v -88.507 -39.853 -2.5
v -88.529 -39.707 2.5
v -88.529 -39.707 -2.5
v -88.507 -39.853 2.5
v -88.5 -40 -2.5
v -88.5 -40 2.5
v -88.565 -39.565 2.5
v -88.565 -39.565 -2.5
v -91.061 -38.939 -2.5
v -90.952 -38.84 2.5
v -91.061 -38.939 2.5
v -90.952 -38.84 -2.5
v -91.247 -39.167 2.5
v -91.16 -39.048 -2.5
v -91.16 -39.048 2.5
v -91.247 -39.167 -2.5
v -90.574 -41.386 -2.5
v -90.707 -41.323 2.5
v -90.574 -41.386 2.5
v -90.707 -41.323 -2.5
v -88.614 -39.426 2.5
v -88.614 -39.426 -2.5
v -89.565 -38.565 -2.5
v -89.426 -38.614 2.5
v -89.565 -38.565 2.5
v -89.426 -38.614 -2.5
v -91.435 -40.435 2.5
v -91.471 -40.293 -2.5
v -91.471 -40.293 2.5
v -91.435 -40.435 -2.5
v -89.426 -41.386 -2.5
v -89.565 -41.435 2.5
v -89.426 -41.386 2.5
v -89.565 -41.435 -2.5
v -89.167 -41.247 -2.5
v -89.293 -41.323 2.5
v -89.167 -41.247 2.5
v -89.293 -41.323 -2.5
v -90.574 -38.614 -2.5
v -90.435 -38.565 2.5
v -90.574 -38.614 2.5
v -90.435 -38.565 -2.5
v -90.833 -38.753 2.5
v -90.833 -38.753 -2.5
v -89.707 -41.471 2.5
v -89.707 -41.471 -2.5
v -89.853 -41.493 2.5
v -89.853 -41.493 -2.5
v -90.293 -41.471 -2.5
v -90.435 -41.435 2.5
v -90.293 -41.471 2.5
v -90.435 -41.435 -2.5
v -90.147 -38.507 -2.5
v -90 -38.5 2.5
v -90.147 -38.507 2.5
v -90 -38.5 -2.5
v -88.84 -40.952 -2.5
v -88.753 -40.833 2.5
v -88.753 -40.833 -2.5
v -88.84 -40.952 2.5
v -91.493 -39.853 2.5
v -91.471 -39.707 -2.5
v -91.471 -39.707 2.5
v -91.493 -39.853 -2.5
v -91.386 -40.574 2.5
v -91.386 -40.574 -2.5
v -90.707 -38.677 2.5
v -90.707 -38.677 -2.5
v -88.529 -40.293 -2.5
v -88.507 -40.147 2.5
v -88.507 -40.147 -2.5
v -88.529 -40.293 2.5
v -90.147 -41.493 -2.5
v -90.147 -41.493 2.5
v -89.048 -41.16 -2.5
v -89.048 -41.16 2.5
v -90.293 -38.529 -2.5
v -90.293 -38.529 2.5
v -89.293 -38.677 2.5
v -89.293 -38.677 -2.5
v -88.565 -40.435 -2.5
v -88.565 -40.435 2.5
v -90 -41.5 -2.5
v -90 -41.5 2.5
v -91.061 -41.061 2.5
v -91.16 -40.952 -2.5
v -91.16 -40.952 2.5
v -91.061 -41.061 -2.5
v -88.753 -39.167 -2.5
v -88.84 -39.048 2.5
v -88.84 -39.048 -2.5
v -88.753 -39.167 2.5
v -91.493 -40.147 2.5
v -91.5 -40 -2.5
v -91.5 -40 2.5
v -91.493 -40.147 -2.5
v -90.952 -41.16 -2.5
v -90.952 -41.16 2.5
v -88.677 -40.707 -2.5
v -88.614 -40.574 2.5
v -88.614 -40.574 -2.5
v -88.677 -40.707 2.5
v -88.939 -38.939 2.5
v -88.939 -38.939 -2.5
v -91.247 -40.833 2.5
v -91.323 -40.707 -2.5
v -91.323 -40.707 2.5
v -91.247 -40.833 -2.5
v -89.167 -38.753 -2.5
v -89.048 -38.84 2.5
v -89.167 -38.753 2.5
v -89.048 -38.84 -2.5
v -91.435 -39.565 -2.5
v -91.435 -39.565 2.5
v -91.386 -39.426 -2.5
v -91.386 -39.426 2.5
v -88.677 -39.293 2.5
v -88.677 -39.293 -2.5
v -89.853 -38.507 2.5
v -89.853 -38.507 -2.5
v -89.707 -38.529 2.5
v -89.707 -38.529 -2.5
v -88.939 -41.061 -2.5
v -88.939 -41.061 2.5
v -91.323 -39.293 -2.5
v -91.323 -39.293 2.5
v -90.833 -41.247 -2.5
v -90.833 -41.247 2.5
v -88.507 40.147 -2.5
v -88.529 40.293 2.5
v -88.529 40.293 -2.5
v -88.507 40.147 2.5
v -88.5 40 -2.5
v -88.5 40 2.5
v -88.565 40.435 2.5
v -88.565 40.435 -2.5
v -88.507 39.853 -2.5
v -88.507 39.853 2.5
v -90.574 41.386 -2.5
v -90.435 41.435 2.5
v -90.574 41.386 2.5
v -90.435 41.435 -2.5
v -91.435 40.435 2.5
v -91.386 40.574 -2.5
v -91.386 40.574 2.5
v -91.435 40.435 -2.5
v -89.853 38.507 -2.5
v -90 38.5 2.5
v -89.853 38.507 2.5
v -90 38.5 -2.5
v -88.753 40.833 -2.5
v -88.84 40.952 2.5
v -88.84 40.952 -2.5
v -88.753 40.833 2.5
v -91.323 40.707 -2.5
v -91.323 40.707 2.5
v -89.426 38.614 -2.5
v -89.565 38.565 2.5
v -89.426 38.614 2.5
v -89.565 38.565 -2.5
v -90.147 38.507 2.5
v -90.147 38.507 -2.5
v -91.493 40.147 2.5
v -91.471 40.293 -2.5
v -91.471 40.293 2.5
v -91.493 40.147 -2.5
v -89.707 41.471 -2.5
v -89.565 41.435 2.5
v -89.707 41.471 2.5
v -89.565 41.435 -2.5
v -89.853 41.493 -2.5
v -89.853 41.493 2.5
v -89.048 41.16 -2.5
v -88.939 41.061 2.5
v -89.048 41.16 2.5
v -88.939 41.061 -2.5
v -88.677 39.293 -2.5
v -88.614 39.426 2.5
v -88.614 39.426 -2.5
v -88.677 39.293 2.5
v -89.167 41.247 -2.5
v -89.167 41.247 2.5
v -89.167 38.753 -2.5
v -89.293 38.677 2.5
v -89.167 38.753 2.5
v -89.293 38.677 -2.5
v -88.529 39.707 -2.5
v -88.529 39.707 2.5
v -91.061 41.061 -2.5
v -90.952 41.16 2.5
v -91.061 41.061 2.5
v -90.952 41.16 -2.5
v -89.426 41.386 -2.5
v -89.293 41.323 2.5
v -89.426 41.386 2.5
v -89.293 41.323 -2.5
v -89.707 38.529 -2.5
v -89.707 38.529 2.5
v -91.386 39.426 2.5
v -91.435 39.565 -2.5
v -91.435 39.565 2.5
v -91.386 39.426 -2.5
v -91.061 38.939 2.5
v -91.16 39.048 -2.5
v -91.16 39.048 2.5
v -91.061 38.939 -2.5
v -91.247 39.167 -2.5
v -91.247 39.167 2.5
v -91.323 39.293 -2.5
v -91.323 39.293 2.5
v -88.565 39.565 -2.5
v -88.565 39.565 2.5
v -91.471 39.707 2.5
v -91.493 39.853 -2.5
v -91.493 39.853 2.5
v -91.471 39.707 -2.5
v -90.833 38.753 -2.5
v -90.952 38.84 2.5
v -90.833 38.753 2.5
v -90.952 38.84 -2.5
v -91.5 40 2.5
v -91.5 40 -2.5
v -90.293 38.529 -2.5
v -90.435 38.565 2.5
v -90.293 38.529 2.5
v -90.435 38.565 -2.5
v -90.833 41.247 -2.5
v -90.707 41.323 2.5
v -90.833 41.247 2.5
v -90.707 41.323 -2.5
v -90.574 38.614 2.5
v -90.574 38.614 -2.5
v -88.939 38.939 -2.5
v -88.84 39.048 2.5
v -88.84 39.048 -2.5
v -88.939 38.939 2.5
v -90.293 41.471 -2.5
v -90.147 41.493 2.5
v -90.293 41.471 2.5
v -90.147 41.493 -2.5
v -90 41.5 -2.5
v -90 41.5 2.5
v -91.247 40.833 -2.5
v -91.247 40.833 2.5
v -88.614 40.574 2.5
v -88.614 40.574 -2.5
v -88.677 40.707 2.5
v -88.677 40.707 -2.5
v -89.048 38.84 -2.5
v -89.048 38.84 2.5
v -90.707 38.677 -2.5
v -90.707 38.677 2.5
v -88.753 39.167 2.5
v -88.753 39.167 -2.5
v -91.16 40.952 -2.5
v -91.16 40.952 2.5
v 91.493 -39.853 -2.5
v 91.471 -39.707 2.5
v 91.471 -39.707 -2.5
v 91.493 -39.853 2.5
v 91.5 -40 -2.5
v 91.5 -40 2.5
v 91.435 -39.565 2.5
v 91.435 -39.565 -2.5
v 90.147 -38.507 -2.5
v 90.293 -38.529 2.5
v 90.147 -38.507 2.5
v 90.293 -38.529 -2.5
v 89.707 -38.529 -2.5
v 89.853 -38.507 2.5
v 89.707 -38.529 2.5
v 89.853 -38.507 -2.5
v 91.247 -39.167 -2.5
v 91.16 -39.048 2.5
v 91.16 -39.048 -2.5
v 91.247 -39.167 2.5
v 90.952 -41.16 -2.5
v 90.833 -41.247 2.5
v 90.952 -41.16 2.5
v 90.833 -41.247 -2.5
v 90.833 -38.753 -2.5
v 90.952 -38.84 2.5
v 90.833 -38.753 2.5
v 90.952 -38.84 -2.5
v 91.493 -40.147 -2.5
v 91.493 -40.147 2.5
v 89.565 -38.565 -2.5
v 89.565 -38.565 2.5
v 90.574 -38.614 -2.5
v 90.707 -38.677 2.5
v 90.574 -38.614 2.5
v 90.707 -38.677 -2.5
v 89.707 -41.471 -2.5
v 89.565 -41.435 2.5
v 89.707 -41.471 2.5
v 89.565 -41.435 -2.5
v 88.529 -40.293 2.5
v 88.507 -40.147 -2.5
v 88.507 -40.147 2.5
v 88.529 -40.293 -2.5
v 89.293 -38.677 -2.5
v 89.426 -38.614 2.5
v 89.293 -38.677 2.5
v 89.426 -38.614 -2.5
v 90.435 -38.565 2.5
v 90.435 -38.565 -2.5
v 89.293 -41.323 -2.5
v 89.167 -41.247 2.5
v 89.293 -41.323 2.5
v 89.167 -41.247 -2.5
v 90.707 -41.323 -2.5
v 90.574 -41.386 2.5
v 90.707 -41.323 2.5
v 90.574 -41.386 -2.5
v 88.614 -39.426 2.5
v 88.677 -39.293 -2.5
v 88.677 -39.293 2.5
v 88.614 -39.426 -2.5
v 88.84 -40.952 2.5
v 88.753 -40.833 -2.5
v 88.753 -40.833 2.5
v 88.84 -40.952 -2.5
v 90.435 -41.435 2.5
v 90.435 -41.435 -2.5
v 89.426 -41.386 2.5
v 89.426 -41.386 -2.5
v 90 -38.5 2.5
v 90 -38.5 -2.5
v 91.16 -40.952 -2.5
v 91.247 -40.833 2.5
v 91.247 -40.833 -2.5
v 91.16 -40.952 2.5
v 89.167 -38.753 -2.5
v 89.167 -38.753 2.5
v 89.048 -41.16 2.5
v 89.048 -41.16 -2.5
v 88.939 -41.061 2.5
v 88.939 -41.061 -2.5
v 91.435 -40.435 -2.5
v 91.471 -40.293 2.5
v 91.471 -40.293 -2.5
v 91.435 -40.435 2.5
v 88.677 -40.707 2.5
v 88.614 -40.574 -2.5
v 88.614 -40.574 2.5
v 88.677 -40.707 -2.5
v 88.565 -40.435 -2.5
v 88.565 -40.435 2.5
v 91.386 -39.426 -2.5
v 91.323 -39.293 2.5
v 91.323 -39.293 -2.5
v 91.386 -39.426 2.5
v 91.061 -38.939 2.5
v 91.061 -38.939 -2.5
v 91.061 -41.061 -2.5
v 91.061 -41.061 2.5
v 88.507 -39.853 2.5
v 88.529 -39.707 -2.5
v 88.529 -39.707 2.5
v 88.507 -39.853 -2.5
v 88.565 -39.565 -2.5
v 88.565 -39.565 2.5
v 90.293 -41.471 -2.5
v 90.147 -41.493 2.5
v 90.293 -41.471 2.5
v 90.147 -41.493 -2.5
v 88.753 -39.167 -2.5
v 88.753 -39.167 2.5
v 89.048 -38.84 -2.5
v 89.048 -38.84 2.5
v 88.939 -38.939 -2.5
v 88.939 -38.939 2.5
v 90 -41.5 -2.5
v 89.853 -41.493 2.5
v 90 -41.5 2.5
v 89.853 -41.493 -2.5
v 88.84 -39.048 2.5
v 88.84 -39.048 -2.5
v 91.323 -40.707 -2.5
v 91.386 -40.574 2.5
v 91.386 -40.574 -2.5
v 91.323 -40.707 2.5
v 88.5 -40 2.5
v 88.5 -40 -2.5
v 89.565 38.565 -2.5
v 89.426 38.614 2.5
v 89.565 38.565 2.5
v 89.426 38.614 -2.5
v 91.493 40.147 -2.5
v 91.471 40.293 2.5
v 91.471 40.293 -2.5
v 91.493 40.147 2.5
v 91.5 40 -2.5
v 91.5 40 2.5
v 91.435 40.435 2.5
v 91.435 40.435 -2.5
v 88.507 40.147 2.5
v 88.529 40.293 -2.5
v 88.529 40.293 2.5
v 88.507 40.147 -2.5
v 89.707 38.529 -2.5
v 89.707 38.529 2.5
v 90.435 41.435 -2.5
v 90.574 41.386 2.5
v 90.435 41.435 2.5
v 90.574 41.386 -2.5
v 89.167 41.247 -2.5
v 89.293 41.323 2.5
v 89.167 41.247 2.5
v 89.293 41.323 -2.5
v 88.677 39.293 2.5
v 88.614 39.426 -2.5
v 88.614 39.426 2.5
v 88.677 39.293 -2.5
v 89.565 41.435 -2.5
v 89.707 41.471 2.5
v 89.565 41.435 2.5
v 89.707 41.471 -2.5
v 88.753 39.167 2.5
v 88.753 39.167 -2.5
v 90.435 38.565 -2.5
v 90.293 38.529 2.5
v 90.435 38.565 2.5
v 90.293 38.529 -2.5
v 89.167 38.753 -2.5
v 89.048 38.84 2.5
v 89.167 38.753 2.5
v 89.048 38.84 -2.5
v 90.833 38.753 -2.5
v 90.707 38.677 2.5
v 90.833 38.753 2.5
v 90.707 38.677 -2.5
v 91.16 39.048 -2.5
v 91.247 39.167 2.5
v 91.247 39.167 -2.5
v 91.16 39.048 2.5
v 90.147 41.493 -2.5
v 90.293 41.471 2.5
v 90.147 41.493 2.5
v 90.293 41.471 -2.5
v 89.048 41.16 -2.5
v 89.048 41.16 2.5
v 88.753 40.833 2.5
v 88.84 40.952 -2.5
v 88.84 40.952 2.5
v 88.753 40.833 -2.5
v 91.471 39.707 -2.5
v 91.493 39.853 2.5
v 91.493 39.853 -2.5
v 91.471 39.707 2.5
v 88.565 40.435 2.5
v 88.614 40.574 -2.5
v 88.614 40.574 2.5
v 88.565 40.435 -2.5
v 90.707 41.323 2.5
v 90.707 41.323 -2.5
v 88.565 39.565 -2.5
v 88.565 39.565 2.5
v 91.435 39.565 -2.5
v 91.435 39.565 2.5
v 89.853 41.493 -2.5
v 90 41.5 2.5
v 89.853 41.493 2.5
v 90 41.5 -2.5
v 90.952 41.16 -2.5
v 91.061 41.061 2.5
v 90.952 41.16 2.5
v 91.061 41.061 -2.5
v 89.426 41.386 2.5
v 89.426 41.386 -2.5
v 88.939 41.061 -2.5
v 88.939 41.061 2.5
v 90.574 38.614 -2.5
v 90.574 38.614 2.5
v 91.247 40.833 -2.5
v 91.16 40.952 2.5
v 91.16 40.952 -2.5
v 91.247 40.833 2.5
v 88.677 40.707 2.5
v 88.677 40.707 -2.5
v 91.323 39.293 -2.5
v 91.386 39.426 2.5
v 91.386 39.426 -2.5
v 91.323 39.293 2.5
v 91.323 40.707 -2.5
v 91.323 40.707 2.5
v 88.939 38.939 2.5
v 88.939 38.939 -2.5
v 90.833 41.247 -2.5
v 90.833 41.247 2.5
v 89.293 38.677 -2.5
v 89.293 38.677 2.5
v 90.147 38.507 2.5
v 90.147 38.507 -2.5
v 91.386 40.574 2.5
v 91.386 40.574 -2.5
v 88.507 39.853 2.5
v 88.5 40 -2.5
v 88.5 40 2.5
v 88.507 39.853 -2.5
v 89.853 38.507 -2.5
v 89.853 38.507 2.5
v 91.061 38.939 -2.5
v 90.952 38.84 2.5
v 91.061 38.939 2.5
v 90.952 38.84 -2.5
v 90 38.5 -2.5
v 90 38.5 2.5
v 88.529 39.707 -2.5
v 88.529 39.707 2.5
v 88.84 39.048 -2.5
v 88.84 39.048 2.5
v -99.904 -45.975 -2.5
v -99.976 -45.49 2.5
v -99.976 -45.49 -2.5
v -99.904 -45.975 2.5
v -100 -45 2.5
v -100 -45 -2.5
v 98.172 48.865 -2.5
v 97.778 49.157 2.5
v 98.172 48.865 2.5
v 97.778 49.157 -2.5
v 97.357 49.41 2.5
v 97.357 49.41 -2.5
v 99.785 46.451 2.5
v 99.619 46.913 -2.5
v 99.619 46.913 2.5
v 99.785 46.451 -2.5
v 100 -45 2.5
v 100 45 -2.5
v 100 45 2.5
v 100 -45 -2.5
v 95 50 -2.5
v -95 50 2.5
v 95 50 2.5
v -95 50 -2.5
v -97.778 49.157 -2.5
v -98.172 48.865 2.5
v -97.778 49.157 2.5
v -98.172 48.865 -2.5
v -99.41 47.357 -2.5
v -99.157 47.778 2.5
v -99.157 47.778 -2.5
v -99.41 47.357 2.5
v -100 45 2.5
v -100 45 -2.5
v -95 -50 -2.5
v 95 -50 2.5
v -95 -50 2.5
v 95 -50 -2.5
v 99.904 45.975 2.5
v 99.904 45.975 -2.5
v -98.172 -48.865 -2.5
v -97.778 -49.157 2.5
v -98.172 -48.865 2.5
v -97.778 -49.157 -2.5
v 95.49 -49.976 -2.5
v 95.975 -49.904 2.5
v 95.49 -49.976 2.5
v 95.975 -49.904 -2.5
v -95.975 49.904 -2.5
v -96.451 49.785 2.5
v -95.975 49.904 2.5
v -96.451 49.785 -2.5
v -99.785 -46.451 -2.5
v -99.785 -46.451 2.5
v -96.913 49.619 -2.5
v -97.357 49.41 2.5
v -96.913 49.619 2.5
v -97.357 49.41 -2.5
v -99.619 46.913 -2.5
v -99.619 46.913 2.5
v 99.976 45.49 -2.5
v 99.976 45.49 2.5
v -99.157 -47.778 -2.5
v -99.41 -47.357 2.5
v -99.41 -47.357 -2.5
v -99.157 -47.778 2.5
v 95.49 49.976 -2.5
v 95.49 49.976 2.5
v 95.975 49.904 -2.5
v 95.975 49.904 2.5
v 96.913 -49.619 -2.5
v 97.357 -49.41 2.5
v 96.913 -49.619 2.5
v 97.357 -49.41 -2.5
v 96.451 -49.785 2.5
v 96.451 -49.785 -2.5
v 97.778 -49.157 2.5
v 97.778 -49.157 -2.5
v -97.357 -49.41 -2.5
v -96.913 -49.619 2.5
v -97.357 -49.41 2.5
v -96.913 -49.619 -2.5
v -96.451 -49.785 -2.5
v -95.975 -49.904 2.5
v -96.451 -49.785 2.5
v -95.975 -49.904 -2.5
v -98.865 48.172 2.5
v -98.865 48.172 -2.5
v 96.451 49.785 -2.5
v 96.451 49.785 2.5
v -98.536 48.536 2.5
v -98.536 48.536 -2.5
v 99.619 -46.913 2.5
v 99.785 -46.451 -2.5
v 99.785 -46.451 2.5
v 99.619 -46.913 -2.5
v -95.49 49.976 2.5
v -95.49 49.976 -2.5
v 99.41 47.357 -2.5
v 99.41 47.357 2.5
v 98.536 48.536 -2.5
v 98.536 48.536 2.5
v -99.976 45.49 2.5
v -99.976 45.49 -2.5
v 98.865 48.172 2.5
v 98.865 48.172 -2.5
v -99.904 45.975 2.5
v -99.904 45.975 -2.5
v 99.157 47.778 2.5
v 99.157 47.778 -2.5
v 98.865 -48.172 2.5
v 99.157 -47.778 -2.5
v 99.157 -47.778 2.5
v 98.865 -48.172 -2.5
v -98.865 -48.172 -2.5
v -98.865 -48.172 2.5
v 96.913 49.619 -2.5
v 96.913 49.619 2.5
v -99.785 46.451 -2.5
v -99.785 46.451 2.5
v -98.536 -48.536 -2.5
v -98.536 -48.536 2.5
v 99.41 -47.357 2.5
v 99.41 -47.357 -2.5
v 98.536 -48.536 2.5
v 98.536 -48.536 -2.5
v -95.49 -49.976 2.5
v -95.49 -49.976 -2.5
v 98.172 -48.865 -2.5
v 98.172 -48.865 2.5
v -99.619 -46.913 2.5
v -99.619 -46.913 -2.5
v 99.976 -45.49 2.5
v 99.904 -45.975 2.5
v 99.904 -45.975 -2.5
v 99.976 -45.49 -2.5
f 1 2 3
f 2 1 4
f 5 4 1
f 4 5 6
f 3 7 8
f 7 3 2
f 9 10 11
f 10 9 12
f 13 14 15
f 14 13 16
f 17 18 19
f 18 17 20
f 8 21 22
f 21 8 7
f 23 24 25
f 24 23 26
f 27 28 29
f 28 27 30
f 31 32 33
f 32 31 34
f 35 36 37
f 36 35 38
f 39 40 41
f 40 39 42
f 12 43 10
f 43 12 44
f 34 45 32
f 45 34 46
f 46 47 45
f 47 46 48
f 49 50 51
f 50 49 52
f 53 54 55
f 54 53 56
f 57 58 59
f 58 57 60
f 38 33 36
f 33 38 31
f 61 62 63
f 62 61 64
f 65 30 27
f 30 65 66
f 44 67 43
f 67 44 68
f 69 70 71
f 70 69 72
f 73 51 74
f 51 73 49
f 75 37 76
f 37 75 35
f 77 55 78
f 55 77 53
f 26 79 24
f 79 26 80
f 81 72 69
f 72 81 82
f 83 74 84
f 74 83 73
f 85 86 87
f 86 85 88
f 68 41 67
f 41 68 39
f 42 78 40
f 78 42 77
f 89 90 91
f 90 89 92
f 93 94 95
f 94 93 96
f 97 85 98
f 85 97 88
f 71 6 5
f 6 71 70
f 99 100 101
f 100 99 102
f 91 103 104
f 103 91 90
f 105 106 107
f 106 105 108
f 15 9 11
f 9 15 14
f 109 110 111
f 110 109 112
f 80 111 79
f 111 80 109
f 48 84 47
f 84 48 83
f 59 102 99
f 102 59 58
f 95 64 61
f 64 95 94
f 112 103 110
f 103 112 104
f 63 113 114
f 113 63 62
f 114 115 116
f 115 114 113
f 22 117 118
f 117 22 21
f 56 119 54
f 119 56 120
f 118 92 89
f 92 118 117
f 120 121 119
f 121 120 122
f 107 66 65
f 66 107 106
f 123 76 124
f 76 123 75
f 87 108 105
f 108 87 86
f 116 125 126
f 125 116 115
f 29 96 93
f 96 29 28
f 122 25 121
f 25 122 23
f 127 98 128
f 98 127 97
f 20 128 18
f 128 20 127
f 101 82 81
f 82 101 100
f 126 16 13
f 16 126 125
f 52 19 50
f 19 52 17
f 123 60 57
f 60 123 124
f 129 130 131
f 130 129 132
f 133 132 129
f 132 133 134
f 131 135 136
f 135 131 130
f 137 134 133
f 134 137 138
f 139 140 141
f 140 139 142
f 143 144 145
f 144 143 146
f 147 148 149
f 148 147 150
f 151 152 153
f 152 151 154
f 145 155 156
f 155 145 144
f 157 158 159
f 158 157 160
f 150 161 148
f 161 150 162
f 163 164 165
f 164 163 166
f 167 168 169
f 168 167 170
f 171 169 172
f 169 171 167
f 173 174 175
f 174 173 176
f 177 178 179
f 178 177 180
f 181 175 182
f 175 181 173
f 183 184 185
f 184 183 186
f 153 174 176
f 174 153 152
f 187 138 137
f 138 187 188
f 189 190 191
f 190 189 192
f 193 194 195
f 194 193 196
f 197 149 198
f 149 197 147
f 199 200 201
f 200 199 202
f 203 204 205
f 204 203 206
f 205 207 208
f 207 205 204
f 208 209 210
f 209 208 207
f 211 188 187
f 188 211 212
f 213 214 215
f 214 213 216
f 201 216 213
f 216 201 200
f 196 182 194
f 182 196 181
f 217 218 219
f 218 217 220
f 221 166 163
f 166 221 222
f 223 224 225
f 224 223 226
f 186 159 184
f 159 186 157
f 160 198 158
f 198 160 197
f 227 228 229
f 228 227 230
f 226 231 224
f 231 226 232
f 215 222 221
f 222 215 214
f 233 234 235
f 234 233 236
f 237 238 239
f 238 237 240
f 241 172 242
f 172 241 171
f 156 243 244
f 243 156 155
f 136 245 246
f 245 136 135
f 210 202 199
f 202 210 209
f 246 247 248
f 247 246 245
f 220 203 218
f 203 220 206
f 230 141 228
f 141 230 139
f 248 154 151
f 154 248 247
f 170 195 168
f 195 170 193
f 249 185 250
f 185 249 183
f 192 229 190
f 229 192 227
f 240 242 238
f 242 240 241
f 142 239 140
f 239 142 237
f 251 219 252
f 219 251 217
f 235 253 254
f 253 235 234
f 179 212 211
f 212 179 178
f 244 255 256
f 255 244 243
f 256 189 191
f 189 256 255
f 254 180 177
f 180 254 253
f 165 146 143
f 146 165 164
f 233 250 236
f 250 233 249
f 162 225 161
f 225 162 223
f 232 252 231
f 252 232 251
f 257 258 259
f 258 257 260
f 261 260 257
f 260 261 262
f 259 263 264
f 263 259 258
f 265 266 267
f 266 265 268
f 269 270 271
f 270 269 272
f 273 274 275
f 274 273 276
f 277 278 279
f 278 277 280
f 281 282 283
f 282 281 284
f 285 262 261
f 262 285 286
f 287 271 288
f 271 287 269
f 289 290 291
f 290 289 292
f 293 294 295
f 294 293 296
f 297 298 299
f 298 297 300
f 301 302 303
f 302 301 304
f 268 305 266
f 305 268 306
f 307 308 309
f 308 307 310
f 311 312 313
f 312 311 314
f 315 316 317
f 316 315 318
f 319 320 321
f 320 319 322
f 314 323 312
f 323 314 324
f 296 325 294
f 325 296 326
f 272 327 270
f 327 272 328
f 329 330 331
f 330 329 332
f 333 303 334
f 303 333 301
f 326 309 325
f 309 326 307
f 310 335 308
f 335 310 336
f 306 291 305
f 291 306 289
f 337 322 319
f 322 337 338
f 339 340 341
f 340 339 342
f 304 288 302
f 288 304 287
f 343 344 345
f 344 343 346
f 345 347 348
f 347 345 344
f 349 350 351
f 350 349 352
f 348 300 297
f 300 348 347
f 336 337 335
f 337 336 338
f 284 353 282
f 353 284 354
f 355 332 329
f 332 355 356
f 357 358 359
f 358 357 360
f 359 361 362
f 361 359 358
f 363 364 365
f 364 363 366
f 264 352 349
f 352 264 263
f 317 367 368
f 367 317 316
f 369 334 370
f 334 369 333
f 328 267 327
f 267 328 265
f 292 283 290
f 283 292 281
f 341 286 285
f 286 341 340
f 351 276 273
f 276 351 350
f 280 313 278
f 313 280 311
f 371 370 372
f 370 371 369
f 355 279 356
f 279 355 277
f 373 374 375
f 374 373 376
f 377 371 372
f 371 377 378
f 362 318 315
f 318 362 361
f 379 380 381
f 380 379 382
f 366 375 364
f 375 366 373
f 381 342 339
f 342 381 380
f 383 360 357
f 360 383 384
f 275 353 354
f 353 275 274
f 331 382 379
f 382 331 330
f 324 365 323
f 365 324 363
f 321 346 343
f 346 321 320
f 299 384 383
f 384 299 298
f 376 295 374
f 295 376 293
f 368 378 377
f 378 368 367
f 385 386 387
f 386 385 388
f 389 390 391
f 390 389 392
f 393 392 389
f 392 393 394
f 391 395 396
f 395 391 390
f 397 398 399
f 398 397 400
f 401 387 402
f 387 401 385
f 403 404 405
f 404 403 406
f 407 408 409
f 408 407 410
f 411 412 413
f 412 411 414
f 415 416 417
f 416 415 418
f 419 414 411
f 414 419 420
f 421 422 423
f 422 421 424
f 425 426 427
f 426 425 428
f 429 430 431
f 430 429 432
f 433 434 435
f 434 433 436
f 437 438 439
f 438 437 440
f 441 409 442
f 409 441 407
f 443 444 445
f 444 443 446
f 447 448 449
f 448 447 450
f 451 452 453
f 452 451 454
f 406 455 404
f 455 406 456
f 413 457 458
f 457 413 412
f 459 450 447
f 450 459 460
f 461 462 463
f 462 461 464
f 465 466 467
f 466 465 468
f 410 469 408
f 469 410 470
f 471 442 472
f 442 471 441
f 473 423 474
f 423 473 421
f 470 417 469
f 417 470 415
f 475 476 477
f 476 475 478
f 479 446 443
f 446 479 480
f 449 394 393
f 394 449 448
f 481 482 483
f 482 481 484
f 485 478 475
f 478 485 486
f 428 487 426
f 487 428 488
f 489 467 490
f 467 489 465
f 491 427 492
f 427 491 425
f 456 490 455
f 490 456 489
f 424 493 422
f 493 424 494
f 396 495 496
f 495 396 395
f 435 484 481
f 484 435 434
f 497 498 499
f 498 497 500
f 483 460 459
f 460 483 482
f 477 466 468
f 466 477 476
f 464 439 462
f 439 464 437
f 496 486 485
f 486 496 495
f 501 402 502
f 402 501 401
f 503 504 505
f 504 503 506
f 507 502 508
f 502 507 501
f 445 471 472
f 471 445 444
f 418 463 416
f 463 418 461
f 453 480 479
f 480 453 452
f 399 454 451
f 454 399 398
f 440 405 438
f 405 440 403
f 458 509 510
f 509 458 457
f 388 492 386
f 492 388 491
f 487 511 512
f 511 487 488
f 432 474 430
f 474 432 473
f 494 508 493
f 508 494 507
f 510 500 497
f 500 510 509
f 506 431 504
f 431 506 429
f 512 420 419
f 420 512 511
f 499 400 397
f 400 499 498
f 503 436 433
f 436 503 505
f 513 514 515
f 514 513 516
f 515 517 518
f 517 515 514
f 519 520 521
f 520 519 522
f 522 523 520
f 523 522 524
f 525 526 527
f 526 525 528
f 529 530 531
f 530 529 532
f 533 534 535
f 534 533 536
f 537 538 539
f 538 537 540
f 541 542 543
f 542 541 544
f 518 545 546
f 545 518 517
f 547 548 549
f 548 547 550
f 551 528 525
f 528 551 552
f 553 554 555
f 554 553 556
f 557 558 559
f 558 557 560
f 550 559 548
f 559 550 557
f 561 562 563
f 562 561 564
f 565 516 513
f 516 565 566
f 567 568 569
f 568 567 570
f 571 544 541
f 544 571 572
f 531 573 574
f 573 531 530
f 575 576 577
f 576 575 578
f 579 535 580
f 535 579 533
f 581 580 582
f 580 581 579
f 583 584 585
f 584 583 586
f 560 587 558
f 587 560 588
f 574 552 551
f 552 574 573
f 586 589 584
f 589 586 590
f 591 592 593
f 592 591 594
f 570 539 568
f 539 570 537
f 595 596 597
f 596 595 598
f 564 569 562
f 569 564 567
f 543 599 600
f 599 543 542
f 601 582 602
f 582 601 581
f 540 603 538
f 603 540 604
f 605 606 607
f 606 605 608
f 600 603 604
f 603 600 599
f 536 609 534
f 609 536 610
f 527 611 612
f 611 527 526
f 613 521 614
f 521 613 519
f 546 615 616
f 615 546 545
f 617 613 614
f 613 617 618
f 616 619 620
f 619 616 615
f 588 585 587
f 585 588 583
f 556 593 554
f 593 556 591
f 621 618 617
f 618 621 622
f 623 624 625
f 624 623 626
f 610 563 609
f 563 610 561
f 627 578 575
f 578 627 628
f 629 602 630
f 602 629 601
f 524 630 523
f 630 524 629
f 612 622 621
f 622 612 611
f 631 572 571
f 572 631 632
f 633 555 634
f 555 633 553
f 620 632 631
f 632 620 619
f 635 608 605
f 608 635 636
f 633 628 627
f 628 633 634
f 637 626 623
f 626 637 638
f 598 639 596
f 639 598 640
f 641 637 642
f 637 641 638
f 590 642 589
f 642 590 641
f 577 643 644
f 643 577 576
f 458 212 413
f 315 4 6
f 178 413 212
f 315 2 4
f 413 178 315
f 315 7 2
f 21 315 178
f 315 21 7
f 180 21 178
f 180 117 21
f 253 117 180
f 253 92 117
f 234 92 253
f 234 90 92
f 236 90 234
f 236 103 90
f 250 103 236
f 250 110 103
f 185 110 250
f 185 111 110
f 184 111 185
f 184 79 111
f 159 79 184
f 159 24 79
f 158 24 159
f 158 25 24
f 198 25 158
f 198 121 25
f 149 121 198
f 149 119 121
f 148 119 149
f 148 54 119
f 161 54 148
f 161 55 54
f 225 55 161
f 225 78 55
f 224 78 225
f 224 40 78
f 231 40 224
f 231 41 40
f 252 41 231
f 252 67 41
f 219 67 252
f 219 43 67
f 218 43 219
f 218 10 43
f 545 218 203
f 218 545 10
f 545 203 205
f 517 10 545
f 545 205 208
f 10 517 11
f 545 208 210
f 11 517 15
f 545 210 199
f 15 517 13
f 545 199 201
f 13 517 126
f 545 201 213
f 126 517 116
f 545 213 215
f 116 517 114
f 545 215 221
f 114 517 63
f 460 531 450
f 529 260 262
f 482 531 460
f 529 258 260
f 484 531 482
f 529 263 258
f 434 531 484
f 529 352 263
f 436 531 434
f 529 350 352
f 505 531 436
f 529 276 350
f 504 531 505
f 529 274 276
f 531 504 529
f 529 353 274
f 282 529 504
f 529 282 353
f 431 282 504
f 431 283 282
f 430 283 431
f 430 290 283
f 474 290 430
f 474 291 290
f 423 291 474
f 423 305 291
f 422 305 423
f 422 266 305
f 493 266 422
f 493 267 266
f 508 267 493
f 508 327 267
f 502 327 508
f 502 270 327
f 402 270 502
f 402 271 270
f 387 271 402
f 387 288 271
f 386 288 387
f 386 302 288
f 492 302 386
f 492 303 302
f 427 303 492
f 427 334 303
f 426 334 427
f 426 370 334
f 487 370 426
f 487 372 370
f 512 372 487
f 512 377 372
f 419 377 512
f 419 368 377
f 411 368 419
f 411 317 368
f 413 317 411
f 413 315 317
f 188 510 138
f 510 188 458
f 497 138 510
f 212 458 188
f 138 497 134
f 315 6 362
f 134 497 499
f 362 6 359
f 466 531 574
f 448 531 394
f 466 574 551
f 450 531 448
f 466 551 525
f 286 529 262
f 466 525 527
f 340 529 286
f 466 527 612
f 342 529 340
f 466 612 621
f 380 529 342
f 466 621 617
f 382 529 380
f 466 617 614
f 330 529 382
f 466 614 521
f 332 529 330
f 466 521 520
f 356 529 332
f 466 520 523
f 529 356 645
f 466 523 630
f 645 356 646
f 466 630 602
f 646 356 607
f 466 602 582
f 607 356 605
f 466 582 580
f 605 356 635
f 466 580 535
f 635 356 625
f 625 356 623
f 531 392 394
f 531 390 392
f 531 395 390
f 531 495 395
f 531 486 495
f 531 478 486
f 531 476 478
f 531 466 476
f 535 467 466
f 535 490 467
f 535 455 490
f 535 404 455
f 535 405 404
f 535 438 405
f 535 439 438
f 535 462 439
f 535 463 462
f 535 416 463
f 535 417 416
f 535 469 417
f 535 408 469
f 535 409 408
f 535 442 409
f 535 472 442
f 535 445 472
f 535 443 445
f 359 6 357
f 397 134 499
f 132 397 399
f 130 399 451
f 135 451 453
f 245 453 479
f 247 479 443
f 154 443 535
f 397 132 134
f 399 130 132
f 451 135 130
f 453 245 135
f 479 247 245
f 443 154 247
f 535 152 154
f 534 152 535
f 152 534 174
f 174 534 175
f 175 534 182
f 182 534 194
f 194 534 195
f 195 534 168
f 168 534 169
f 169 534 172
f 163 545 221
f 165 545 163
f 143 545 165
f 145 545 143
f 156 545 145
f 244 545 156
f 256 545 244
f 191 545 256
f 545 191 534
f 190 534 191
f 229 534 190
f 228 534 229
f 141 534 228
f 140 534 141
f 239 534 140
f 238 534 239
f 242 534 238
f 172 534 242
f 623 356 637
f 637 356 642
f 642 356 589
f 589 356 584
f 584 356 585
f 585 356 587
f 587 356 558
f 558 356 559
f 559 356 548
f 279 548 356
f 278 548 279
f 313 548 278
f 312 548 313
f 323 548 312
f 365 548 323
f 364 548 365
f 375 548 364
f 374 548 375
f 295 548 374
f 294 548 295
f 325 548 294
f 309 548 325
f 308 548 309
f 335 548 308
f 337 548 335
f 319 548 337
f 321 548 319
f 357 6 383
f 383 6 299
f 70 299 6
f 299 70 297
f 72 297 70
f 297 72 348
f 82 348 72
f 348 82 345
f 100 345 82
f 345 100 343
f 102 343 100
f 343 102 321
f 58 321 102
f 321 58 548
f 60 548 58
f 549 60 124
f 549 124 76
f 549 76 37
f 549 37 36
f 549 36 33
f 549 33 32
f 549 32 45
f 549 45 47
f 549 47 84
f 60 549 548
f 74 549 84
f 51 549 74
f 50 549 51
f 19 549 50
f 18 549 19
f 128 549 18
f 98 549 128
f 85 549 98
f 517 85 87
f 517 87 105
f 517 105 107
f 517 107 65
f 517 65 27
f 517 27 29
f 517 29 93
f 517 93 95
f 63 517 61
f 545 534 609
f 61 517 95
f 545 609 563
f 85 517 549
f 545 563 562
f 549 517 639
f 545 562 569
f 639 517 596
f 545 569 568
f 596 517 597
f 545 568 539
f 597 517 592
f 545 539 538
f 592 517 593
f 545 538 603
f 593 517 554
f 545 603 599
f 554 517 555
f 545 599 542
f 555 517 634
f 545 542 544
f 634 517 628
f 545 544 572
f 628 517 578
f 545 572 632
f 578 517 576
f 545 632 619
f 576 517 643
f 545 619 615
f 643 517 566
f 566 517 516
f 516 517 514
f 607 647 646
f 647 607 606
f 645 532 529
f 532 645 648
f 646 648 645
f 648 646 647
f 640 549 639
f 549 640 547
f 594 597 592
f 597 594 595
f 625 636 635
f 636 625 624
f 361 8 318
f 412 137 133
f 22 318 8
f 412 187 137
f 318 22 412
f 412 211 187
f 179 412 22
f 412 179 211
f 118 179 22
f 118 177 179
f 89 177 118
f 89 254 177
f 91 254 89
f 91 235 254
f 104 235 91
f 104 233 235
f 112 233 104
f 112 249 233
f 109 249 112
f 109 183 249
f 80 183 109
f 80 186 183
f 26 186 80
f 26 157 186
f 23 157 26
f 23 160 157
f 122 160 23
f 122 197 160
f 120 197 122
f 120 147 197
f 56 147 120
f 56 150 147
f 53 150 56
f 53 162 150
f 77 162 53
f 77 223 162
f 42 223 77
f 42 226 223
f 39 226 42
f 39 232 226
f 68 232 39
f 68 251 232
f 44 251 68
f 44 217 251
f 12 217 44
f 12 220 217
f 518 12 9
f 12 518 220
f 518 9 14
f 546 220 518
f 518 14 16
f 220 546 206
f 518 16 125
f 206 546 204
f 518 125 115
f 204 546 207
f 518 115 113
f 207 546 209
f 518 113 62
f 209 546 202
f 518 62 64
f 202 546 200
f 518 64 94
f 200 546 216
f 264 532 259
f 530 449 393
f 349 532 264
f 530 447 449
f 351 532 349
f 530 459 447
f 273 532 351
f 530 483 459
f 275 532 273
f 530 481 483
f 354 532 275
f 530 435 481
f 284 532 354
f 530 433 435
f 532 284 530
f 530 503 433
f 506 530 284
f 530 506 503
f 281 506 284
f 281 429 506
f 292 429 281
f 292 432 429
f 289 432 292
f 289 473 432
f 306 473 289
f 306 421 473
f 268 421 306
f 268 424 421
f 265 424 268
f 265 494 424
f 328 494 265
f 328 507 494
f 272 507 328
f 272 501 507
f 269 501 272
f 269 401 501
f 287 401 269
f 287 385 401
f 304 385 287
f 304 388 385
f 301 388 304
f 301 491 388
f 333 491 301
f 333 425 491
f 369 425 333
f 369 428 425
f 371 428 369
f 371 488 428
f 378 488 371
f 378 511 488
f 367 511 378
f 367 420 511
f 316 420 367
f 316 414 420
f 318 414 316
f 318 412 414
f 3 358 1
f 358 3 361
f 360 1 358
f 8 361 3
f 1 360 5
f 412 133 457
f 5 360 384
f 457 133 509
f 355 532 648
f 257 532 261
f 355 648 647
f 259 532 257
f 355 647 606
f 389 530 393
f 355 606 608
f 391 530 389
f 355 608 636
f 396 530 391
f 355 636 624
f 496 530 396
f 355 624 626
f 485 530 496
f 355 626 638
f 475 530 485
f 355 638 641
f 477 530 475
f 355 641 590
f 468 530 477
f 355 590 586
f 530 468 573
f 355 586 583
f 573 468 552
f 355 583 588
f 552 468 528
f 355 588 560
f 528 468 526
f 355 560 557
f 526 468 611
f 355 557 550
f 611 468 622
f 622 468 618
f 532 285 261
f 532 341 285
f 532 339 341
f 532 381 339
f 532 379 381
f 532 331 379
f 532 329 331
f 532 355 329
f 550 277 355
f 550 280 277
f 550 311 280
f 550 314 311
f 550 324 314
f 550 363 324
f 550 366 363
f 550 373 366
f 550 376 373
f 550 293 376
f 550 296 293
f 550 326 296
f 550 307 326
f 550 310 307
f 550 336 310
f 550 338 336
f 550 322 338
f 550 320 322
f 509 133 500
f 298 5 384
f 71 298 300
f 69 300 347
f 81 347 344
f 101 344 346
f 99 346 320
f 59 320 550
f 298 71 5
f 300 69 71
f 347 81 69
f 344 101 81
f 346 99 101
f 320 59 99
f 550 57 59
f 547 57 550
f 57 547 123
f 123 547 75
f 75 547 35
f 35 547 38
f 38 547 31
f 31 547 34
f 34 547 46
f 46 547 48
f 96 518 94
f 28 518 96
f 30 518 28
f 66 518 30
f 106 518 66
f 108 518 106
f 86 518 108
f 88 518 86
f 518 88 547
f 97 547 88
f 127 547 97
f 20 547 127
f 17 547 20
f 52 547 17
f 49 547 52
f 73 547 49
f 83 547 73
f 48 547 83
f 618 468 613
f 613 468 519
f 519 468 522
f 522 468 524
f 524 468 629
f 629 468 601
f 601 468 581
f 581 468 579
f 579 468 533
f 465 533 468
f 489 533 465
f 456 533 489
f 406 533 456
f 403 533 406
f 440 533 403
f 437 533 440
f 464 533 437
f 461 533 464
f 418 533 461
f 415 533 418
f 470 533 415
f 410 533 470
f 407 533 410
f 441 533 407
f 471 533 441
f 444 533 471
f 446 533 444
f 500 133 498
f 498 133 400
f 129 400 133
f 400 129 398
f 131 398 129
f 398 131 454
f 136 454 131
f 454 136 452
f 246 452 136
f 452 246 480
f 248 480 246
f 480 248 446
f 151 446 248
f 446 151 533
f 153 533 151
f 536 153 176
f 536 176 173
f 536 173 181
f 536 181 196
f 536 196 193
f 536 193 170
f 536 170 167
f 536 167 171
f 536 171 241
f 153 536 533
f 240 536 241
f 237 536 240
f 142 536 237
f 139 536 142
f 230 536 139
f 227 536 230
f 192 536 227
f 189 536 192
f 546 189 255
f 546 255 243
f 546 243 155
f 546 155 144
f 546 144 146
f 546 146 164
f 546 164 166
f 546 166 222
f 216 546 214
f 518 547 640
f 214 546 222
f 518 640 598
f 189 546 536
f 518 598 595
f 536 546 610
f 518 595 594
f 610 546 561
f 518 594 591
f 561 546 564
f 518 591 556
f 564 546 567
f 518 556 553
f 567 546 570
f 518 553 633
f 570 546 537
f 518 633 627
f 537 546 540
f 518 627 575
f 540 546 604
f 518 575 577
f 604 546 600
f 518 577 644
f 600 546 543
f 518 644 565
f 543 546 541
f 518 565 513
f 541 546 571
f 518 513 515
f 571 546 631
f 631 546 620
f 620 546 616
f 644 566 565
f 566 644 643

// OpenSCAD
$fn = 64;

// Parameters
sheet_length    = 200;
sheet_width     = 100;
sheet_thickness = 5;

corner_radius   = 5;   // rounded/chamfer-like corners (MDF sheet edge finish)
hole_diameter   = 3;
hole_edge_inset = 10;  // distance from each edge to hole center

// MDF-like color (visual only)
mdf_color = [0.78, 0.67, 0.50];

// 2D rounded rectangle (robust, non-blank)
module rounded_rect_2d(L, W, R) {
    R2 = min(R, min(L, W)/2);
    hull() {
        for (sx = [-1, 1], sy = [-1, 1])
            translate([sx*(L/2 - R2), sy*(W/2 - R2)])
                circle(r = R2);
    }
}

// Main sheet solid
module sheet_solid() {
    linear_extrude(height = sheet_thickness, center = true)
        rounded_rect_2d(sheet_length, sheet_width, corner_radius);
}

// Mounting holes (through)
module holes() {
    for (sx = [-1, 1], sy = [-1, 1]) {
        translate([
            sx*(sheet_length/2 - hole_edge_inset),
            sy*(sheet_width/2  - hole_edge_inset),
            0
        ])
            cylinder(h = sheet_thickness + 0.2, d = hole_diameter, center = true);
    }
}

// Final model: one connected solid (sheet with holes)
color(mdf_color)
difference() {
    sheet_solid();
    holes();
}
